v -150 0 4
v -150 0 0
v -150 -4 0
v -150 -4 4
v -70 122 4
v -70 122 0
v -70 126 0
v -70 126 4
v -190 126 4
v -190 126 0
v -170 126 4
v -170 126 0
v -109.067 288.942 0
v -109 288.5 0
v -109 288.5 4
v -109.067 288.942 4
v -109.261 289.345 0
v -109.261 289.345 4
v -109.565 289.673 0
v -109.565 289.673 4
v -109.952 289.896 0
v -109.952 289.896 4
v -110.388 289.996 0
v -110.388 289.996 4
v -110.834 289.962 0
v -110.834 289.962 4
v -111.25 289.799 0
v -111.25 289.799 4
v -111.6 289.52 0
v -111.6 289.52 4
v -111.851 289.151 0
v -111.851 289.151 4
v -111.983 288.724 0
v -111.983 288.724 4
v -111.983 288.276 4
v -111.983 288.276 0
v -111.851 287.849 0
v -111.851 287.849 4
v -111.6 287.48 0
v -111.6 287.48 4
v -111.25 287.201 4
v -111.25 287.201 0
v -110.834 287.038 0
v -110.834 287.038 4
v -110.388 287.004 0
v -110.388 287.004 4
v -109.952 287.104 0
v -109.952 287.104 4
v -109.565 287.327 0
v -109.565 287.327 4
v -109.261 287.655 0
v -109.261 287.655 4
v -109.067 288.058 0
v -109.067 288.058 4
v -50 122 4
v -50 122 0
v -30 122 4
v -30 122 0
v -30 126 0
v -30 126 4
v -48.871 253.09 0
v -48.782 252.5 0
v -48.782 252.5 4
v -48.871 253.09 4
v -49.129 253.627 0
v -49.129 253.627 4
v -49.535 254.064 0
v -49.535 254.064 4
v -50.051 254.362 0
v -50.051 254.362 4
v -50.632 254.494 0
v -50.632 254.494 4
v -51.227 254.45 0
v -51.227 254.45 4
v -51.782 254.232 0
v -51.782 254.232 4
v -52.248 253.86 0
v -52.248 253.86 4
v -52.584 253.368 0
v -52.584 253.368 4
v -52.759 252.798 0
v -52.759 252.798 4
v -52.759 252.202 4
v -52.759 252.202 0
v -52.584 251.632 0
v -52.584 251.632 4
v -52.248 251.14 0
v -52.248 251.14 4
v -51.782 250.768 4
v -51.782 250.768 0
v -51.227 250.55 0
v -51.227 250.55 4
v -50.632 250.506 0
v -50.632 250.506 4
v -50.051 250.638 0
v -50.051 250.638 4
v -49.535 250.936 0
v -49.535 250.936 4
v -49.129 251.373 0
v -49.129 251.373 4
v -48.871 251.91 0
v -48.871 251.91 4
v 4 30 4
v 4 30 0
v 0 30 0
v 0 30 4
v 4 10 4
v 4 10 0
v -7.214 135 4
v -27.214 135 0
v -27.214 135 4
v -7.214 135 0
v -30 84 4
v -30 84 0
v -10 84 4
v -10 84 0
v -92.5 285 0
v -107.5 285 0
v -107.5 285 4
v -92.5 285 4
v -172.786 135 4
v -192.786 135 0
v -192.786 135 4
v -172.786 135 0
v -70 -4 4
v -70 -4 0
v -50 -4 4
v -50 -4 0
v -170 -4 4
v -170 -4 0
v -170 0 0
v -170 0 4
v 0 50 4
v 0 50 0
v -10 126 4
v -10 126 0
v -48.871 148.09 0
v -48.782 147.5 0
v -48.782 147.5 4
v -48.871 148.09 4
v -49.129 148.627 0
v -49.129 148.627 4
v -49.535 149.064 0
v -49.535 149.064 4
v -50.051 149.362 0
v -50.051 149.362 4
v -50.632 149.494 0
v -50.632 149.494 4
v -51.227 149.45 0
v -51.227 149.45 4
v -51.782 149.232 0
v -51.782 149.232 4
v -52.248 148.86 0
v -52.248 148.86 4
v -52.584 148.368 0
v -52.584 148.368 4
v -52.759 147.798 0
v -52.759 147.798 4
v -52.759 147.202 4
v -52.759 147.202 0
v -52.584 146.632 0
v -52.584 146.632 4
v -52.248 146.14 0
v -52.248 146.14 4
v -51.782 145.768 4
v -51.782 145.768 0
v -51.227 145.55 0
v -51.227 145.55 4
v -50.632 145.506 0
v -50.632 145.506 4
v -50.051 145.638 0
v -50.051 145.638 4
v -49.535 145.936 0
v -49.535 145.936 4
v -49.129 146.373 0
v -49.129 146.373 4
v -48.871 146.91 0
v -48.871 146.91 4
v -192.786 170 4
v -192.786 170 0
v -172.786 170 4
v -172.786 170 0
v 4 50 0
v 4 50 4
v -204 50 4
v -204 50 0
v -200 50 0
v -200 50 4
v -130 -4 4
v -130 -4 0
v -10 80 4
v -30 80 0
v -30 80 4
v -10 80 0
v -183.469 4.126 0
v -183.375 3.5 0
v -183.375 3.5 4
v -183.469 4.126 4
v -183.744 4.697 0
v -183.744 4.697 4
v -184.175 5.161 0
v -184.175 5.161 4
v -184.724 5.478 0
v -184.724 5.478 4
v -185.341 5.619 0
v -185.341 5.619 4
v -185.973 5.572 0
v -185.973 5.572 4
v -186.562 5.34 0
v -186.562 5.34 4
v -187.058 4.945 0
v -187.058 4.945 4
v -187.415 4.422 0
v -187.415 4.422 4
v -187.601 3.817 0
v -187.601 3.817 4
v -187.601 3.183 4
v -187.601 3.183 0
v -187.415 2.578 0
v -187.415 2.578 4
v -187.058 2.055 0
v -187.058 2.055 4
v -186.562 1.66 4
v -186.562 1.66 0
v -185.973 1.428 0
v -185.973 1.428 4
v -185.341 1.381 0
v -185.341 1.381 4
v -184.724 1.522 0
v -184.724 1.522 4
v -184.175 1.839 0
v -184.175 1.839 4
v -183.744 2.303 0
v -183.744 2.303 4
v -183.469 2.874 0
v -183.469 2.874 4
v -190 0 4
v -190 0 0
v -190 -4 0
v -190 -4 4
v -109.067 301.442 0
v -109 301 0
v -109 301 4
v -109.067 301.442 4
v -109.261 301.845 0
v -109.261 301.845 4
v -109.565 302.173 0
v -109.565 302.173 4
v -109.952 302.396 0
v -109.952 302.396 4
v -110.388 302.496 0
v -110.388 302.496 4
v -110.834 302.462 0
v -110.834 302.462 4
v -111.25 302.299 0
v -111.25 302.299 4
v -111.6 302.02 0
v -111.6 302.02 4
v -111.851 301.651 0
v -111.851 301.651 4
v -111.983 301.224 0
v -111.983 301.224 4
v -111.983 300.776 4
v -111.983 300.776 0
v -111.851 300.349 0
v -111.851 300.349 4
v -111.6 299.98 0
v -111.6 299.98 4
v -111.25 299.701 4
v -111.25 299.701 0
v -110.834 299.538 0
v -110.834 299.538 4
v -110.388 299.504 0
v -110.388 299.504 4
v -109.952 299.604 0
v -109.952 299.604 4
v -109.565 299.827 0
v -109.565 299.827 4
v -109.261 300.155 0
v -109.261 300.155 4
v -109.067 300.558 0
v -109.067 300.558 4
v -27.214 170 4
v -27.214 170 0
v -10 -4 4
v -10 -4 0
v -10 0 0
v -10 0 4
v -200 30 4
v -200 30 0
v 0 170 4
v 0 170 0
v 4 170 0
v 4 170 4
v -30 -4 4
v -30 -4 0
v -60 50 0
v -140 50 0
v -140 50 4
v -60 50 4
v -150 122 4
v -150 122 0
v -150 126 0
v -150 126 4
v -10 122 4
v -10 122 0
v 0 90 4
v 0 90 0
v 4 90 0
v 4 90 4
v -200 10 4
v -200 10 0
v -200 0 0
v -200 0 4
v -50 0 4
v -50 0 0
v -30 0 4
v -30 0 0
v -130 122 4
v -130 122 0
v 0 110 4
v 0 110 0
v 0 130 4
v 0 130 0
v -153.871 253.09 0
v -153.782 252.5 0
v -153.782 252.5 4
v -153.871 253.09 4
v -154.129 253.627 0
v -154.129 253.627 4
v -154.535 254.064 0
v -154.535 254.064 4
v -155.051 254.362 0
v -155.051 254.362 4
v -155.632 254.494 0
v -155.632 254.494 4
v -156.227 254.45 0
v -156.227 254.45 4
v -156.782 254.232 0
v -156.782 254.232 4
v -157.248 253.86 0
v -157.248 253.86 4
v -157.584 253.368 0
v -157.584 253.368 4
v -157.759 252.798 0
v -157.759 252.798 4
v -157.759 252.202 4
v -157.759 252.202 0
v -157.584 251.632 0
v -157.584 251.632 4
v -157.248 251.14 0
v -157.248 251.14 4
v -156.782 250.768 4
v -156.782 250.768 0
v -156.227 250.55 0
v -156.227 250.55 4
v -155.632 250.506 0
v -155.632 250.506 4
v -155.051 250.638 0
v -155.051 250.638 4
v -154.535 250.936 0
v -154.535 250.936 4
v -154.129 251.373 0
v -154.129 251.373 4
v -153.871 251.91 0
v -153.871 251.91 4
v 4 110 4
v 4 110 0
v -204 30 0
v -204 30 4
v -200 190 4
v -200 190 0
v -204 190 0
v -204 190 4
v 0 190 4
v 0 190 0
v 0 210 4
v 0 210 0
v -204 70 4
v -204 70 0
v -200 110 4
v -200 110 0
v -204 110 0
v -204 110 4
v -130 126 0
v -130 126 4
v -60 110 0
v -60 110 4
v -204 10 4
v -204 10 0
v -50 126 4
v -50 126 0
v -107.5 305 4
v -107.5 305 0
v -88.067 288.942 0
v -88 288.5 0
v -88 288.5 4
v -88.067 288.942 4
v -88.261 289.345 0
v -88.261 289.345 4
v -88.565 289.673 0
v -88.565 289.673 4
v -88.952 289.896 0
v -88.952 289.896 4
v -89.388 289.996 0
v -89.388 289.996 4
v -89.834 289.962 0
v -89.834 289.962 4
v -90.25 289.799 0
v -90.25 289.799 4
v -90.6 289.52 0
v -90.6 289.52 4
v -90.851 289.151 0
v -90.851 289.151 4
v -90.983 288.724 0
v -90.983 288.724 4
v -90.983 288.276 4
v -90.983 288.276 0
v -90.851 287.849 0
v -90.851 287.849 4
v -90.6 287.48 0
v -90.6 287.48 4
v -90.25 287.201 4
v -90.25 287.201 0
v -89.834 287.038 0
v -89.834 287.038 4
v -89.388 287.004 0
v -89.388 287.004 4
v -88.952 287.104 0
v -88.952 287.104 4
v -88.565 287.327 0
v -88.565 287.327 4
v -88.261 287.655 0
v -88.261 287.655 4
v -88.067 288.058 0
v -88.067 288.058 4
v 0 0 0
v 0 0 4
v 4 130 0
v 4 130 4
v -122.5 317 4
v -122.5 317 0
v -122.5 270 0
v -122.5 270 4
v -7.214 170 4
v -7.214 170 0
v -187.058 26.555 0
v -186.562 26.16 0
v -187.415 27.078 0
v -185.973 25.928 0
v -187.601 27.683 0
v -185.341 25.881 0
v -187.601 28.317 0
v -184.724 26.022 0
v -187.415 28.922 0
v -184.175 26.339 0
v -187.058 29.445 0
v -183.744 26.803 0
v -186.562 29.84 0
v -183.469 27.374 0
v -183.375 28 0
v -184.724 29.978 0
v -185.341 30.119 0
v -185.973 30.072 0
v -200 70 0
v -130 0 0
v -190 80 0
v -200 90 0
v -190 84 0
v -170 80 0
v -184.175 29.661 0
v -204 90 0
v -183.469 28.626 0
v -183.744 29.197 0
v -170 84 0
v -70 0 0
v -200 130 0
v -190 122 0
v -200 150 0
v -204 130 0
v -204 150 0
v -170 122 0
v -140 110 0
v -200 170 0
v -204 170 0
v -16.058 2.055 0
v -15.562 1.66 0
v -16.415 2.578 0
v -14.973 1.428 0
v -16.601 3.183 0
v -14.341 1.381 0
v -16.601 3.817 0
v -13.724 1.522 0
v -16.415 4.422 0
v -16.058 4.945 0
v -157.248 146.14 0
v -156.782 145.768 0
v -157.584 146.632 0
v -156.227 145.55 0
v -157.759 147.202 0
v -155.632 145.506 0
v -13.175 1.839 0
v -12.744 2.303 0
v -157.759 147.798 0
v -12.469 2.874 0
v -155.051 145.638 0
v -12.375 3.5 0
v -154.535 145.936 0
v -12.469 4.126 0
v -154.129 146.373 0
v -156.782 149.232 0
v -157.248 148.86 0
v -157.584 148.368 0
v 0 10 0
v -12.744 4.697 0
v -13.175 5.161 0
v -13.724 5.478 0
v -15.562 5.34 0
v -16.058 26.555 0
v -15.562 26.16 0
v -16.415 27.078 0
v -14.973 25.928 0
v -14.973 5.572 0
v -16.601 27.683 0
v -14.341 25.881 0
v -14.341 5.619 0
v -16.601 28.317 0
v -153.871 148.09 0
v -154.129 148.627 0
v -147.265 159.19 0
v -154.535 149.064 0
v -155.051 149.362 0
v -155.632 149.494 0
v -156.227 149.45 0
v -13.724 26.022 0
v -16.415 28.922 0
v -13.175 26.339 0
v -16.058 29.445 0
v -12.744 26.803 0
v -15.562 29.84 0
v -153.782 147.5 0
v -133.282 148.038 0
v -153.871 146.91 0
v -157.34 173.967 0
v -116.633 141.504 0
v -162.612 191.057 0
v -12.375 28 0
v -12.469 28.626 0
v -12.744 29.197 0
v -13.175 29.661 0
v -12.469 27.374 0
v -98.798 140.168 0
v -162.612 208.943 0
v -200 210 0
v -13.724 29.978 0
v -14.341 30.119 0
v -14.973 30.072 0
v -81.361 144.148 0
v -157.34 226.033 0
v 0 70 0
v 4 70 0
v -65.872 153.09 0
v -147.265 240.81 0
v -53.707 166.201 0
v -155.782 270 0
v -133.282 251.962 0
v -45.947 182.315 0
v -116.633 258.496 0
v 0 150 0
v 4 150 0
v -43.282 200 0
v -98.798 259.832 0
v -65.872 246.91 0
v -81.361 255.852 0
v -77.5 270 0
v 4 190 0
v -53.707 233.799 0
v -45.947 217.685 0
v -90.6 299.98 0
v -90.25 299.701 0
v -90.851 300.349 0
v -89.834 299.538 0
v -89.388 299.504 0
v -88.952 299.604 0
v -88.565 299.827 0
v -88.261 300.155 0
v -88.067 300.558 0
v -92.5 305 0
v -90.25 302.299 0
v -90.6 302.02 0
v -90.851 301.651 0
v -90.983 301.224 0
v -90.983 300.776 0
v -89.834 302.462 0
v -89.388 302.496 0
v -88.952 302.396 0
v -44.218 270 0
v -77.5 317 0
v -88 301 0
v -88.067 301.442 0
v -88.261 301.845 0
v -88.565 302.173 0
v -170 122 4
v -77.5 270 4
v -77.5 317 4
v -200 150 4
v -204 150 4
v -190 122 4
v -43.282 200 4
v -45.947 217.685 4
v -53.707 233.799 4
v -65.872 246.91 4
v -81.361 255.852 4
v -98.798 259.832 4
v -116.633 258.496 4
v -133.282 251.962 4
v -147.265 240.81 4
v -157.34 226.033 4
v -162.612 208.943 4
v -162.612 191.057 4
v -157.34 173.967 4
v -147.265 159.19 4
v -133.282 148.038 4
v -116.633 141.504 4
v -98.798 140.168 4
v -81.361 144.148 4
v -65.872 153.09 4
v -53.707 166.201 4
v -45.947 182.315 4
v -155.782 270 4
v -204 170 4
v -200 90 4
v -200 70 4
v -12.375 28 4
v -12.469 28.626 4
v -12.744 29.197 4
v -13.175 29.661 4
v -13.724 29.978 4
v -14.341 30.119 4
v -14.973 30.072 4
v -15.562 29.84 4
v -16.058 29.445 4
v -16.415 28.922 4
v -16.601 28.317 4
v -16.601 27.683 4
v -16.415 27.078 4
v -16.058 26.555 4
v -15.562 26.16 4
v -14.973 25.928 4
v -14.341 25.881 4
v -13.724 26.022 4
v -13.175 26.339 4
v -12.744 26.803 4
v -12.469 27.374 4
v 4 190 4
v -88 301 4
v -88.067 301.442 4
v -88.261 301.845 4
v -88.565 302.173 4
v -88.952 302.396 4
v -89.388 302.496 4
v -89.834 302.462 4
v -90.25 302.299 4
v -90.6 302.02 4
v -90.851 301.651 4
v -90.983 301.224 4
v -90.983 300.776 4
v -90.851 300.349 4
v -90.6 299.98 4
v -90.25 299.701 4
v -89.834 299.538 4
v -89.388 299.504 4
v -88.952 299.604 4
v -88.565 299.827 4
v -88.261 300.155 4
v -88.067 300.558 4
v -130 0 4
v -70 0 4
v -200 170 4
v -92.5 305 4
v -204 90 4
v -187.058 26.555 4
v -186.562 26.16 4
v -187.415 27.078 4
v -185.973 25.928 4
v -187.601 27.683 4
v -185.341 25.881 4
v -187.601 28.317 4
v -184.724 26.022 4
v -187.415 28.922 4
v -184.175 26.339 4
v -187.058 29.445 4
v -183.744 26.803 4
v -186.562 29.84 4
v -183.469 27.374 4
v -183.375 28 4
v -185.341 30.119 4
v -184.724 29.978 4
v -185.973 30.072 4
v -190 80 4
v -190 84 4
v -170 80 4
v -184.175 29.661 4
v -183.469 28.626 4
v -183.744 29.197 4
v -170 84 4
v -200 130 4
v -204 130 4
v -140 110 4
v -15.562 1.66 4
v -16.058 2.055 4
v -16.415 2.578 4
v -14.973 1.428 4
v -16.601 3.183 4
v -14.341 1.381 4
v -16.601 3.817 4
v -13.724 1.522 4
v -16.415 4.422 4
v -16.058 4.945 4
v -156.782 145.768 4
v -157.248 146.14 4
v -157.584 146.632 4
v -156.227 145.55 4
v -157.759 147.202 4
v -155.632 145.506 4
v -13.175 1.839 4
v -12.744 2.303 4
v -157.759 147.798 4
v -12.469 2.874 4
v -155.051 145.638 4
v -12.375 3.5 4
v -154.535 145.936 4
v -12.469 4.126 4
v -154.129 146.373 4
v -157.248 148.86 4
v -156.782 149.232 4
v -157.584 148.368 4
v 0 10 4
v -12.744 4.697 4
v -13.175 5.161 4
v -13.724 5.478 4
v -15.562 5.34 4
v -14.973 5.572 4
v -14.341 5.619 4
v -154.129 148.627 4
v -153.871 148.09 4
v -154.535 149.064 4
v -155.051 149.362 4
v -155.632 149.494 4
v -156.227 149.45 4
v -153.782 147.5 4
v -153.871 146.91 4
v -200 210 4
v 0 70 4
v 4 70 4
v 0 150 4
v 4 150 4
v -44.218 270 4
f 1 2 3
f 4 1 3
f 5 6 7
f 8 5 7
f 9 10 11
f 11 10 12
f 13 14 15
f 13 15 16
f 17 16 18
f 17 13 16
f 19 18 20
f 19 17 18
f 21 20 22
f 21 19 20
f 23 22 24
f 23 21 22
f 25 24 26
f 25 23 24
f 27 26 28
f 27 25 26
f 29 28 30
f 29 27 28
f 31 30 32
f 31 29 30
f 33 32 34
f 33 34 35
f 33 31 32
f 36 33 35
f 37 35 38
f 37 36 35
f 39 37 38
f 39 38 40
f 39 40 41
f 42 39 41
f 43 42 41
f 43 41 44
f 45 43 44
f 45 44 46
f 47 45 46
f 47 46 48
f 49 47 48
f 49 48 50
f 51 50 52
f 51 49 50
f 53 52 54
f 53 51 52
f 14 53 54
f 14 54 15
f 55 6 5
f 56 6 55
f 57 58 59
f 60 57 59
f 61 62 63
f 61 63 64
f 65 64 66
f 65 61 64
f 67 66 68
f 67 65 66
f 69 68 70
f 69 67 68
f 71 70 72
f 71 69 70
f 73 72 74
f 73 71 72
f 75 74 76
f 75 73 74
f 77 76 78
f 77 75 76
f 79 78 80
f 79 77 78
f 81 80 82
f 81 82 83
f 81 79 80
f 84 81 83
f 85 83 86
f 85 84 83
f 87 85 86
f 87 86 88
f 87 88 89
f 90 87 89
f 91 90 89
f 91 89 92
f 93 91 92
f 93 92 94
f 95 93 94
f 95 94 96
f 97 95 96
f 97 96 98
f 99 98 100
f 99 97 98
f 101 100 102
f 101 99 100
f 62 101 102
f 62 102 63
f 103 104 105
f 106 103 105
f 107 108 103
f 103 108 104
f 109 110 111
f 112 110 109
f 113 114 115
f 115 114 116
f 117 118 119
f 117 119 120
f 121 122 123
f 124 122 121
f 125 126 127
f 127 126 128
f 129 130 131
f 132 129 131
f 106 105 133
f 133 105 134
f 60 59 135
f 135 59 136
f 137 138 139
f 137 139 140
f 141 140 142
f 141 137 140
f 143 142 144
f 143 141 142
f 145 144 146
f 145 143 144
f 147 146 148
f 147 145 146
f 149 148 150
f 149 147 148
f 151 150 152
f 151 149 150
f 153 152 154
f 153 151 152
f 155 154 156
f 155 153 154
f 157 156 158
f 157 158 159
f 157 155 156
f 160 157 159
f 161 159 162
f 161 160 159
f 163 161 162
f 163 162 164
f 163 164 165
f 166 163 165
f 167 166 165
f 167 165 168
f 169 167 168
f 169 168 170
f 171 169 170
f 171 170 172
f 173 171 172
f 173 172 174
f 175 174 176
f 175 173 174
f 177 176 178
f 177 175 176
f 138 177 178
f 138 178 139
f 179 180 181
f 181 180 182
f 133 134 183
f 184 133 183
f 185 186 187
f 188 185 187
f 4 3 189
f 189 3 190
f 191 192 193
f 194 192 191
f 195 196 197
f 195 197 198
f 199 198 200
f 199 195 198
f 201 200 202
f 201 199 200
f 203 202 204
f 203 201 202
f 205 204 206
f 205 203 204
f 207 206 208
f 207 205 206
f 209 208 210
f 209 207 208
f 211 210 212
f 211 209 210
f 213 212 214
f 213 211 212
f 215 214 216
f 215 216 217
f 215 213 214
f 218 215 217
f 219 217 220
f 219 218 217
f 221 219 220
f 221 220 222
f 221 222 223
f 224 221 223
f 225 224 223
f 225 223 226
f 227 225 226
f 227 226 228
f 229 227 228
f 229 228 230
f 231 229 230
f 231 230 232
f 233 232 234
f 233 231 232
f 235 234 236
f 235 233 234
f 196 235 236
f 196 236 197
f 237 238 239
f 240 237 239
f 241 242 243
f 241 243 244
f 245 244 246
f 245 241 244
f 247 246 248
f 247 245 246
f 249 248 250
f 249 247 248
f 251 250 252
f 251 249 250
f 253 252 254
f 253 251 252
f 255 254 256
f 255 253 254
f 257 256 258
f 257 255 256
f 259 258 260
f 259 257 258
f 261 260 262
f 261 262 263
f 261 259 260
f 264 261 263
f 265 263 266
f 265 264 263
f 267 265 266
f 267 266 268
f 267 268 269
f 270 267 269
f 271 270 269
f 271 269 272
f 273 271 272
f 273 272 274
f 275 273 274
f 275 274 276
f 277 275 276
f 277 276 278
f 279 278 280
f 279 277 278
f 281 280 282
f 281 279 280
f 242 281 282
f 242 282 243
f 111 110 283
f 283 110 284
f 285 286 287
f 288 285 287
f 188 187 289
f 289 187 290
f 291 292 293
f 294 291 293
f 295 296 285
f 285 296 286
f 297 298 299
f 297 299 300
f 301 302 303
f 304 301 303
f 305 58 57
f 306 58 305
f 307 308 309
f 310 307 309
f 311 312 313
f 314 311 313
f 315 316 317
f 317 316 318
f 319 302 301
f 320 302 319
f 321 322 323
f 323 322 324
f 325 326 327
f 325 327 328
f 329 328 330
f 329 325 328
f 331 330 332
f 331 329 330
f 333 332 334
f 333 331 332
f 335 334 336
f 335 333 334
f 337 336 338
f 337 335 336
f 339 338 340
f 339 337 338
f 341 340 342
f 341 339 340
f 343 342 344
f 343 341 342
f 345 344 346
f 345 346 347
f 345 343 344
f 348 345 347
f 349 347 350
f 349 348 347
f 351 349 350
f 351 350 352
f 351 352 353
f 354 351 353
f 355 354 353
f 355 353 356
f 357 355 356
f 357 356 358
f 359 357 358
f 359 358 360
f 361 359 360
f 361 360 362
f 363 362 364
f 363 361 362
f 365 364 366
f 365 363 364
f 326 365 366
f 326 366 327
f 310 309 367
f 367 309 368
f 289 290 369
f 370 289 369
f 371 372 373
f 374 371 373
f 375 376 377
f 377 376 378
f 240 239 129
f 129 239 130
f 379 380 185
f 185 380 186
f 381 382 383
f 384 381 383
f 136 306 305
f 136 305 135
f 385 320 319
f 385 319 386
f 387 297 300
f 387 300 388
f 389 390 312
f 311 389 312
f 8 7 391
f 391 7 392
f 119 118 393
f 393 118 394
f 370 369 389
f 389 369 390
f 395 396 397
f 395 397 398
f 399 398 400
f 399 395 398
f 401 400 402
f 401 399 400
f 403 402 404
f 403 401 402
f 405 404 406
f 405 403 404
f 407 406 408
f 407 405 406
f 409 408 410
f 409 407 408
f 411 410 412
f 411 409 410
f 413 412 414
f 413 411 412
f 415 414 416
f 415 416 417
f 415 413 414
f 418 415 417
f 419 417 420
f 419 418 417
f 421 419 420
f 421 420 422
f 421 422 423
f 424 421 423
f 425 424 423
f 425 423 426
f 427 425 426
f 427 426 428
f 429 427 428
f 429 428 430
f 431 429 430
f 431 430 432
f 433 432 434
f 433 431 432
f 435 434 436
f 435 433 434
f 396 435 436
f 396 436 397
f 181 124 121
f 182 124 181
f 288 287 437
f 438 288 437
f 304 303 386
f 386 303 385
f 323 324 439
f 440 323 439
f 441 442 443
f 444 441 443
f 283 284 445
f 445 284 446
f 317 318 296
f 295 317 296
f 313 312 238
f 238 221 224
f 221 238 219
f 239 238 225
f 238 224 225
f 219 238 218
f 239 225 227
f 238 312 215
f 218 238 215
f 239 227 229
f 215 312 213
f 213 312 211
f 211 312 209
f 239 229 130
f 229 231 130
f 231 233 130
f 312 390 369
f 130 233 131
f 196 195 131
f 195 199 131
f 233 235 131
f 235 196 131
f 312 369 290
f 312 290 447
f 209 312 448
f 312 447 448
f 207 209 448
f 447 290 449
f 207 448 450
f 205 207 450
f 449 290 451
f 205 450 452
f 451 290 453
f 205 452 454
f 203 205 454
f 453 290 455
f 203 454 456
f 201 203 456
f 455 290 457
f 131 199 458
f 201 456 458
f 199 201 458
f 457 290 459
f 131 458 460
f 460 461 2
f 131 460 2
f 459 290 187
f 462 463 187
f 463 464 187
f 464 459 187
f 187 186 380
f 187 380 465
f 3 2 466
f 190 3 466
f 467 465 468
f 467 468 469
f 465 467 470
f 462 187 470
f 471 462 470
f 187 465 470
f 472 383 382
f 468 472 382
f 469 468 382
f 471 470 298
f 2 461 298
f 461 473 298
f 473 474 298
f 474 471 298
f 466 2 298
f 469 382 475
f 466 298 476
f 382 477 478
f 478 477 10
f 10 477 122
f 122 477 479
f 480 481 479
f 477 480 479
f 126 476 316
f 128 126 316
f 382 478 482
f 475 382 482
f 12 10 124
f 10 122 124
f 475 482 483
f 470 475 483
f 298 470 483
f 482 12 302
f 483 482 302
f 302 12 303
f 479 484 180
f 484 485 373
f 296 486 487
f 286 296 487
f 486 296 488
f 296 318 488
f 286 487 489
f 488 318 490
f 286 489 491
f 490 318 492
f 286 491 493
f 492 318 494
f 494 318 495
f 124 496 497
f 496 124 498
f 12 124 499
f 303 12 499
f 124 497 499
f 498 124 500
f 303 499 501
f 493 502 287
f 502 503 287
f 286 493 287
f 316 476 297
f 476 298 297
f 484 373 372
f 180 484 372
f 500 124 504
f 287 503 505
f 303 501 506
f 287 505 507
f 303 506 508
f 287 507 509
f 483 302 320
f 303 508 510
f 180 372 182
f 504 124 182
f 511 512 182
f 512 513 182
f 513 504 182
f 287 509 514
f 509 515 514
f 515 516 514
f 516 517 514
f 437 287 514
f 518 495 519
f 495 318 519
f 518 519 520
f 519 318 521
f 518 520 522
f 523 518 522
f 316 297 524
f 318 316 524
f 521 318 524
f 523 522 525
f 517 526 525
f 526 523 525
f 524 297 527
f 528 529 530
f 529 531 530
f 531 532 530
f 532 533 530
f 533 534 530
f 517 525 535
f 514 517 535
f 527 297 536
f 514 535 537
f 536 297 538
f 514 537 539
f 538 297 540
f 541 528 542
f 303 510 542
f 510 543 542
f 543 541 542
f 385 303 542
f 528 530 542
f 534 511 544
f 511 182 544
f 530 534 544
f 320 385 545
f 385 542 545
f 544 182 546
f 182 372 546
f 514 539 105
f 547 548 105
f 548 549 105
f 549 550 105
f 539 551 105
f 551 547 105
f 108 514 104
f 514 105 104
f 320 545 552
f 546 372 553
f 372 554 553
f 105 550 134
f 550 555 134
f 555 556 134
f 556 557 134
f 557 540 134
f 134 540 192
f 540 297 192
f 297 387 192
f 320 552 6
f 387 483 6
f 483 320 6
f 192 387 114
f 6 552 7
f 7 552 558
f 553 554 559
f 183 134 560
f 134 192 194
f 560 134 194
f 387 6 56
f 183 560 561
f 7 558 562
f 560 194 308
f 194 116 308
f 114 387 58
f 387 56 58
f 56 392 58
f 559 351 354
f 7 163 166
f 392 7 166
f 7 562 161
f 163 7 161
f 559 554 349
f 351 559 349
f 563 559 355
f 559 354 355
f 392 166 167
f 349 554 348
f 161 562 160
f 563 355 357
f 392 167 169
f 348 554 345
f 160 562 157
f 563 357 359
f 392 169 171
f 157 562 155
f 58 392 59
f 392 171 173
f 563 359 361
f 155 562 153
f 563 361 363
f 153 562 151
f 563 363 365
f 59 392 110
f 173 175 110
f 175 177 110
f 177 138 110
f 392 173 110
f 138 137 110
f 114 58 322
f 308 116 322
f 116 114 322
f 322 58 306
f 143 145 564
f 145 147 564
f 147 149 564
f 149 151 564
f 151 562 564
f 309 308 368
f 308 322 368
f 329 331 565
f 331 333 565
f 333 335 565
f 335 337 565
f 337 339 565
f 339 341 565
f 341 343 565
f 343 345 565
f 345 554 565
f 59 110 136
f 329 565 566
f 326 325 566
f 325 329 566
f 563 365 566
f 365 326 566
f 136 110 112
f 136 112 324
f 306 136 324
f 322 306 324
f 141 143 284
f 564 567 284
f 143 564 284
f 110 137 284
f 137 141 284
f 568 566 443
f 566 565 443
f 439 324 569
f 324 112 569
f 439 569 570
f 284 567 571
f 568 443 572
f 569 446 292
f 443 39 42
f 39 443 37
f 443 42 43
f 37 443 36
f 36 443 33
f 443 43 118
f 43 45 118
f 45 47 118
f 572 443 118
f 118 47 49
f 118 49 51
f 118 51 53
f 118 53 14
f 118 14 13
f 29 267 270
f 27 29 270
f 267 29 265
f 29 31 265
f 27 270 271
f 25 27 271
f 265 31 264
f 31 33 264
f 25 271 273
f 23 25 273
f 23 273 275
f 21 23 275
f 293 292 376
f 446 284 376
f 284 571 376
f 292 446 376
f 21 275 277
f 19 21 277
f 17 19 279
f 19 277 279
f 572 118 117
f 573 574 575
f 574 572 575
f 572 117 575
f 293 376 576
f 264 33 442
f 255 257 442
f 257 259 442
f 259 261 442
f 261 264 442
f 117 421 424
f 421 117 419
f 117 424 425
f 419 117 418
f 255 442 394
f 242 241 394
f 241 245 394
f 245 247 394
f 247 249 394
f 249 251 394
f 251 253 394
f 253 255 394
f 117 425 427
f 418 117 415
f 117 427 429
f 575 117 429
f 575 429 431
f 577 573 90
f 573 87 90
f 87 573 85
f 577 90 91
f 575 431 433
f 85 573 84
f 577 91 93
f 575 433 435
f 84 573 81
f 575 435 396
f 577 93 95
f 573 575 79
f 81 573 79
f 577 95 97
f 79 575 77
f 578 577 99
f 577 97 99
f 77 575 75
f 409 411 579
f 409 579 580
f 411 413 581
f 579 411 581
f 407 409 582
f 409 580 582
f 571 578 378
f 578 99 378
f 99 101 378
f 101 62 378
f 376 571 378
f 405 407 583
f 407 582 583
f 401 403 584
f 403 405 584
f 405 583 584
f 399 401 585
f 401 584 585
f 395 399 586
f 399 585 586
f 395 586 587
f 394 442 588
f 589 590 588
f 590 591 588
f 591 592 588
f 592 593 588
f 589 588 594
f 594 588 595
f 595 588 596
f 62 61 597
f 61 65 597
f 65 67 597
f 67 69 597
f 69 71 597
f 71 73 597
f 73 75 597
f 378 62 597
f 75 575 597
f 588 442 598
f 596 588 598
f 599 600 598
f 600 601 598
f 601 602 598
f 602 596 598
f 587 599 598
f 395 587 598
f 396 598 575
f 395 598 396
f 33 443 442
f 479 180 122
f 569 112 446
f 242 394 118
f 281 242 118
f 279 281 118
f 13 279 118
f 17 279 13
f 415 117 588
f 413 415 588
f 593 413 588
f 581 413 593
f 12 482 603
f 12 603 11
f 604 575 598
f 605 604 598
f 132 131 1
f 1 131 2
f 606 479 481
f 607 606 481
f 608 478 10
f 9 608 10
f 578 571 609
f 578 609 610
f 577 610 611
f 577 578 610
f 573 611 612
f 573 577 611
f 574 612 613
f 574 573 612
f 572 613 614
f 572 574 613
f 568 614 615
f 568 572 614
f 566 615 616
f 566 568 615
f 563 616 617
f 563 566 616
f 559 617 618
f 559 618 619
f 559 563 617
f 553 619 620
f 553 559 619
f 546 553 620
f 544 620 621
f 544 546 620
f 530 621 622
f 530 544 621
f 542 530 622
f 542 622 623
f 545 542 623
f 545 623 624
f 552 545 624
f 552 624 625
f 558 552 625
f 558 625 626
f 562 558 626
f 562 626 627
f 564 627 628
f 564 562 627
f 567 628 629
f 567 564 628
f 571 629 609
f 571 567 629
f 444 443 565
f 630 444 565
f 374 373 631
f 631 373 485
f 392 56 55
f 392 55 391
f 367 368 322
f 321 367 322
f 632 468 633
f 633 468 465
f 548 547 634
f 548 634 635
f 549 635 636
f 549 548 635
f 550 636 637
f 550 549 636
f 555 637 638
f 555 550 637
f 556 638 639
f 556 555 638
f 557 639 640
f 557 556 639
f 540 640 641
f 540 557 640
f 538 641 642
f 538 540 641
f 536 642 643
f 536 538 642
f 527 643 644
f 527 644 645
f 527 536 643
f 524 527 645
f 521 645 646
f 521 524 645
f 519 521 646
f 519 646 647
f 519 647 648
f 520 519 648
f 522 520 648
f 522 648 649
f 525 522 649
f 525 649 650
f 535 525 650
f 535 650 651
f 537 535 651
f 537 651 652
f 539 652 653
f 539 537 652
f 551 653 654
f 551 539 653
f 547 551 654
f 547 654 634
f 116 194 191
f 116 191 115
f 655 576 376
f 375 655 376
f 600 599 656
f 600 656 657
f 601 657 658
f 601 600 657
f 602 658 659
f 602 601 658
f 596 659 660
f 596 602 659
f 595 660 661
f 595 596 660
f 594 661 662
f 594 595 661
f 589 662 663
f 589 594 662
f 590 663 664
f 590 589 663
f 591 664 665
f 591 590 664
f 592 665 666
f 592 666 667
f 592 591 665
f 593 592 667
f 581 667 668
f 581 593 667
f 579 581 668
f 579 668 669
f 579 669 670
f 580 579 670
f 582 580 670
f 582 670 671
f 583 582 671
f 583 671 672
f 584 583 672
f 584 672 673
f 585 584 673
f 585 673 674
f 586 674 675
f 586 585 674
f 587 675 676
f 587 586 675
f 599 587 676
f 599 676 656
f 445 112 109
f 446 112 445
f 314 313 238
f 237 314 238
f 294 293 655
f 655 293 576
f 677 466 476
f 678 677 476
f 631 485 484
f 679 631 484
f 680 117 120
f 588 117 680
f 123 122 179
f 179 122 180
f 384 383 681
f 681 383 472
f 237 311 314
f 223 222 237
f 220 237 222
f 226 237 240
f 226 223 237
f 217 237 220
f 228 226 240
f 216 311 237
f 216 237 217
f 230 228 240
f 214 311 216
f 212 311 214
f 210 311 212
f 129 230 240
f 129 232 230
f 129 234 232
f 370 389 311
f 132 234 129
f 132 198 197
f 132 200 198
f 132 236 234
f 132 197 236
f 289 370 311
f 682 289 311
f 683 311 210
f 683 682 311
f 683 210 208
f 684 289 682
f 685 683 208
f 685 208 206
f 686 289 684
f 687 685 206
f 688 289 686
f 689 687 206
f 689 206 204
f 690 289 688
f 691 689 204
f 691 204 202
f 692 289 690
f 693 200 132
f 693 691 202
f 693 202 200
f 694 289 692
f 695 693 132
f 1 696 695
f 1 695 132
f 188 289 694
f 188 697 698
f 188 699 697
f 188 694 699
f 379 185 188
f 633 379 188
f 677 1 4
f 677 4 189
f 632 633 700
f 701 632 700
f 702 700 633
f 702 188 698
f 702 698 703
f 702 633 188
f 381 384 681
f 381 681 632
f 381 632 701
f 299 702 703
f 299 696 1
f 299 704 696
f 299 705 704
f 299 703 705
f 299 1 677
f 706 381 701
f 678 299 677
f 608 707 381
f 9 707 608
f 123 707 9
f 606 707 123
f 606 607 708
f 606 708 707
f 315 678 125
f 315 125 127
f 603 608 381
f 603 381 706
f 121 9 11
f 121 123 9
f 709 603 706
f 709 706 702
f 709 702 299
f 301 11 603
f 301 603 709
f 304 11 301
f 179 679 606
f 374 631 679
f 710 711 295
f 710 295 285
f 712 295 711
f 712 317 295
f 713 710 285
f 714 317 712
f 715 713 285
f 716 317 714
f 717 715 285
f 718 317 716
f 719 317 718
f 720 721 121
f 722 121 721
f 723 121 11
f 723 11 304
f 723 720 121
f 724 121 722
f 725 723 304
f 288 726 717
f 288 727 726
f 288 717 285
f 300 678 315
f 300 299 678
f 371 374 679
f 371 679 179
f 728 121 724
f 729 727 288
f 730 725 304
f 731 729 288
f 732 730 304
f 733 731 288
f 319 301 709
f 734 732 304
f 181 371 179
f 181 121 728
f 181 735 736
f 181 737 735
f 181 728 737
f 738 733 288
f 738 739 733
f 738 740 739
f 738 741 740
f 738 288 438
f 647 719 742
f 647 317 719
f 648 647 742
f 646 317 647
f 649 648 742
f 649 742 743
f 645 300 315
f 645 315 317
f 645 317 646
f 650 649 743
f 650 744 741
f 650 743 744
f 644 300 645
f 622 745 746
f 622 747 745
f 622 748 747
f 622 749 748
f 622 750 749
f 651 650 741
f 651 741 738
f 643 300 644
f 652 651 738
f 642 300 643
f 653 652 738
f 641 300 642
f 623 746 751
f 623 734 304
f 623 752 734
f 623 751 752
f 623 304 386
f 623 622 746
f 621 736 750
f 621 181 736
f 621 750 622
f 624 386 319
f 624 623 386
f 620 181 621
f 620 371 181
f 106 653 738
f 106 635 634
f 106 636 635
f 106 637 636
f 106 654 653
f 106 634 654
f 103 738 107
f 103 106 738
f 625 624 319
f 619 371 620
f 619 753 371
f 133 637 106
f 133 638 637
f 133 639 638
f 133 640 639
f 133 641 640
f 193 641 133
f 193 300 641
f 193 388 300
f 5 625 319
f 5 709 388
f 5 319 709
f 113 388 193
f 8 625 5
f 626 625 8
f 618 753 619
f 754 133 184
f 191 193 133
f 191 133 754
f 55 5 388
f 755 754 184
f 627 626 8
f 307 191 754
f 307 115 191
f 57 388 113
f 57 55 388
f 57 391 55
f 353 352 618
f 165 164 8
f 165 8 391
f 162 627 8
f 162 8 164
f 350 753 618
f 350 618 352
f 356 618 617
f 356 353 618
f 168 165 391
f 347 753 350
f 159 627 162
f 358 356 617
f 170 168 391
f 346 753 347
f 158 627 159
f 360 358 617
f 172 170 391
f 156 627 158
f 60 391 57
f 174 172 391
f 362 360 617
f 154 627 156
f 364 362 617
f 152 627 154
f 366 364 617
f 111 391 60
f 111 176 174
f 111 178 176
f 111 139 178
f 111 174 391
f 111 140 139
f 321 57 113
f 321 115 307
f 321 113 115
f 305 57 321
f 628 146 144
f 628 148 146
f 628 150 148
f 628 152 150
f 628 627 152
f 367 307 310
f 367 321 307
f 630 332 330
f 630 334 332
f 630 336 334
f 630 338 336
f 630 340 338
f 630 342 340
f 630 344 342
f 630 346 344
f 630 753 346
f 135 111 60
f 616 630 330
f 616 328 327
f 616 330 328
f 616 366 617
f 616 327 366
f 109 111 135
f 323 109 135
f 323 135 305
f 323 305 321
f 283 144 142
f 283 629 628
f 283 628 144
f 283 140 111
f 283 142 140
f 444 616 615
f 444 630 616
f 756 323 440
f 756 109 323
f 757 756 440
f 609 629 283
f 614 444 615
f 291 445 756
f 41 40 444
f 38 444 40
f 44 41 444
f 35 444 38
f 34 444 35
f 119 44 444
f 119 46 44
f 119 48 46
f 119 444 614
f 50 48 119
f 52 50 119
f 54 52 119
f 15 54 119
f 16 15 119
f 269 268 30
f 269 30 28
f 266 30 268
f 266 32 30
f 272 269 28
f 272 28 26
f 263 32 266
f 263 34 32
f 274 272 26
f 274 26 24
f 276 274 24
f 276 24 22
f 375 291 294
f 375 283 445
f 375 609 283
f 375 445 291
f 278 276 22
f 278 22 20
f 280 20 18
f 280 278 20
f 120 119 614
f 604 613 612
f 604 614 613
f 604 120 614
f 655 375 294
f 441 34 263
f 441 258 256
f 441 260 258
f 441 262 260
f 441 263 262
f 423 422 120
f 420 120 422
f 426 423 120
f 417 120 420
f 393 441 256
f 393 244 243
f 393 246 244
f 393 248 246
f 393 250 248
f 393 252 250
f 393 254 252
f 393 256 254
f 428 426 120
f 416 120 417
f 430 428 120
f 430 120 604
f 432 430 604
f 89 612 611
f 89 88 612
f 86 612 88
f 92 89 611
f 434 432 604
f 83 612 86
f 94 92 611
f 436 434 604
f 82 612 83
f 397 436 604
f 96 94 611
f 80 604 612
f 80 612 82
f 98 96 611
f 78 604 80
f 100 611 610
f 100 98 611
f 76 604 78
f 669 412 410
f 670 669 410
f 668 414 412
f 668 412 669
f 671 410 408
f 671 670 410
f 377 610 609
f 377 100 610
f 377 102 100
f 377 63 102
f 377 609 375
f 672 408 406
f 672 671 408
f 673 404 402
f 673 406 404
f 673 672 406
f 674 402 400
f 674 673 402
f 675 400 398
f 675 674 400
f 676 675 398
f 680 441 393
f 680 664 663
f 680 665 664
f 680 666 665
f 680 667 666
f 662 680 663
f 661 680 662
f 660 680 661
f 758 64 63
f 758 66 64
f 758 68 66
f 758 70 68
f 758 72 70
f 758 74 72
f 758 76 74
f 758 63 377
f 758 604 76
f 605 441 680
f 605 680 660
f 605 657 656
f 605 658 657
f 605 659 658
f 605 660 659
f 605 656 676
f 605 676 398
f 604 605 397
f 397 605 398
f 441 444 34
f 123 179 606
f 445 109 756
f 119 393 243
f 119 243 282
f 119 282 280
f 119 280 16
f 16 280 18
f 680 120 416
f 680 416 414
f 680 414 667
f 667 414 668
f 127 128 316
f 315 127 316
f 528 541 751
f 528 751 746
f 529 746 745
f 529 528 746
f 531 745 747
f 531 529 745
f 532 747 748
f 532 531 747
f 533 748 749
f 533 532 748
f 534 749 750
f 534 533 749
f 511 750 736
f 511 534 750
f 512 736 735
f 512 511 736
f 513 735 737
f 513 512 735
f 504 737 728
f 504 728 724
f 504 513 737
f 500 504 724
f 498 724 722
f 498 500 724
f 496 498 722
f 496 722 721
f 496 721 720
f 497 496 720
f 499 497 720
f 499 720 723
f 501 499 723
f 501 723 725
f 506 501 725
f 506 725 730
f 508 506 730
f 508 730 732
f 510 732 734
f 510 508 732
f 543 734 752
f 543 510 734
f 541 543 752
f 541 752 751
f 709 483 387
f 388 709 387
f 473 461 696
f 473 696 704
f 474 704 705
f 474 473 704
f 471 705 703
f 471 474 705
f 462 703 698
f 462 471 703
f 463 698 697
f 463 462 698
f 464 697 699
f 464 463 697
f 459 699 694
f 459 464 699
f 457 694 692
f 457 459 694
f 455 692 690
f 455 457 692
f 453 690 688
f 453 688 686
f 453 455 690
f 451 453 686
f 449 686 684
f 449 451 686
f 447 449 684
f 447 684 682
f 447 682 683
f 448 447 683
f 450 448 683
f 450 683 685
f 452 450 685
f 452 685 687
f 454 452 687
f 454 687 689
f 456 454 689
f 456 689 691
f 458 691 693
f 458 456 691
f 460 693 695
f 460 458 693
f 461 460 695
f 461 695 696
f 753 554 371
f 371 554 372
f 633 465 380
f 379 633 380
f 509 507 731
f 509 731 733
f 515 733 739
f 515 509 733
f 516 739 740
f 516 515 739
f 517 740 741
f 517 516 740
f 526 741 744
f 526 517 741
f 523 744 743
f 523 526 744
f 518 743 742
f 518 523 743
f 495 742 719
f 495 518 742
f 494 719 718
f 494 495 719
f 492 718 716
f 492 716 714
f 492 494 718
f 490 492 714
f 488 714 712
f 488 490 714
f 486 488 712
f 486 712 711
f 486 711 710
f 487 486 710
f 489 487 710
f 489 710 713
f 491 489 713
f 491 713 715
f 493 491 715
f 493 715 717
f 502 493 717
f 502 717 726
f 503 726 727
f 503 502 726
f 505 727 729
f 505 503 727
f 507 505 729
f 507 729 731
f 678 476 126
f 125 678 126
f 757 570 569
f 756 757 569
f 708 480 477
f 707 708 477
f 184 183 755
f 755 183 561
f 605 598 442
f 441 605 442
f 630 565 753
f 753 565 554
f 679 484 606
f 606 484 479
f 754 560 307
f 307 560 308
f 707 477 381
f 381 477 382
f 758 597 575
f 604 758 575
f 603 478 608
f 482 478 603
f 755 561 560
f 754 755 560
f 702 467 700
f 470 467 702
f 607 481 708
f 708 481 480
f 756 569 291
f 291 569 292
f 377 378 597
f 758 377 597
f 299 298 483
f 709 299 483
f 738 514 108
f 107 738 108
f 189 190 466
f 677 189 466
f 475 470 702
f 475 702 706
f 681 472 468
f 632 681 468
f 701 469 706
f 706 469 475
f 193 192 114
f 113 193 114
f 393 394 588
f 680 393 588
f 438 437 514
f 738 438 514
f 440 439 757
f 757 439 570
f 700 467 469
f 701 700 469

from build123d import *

# Parameters (mm, degrees)
SKICA1_R                = 2.125
SKICA1_W                = 20
SKICA1_H                = 4
SKICA1_H_2              = 35
SKICA1_R_2              = 2
SKICA1_W_2              = 80
SKICA1_H_3              = 60
SKICA1_R_3              = 60
SKICA1_R_4              = 1.5
SKICA1_W_3              = 15
SKICA1_H_4              = 20
P_IDAT_VYSUNUT_M1_DEPTH = 4


with BuildPart() as part:
    # Skica1 → Přidat vysunutím1 (new body)
    with BuildSketch(Plane.XY):
        Polygon((0, 0), (0, 10), (4, 10), (4, 30), (0, 30), (0, 50), (4, 50), (4, 70), (0, 70), (0, 90), (4, 90), (4, 110), (0, 110), (0, 130), (4, 130), (4, 150), (0, 150), (0, 170), (4, 170), (4, 190), (0, 190), (0, 210), (-44.218272824, 270), (-77.5, 270), (-77.5, 317), (-122.5, 317), (-122.5, 270), (-155.781727176, 270), (-200, 210), (-200, 190), (-204, 190), (-204, 170), (-200, 170), (-200, 150), (-204, 150), (-204, 130), (-200, 130), (-200, 110), (-204, 110), (-204, 90), (-200, 90), (-200, 70), (-204, 70), (-204, 50), (-200, 50), (-200, 30), (-204, 30), (-204, 10), (-200, 10), (-200, 0), (-190, 0), (-190, -4), (-170, -4), (-170, 0), (-150, 0), (-150, -4), (-130, -4), (-130, 0), (-70, 0), (-70, -4), (-50, -4), (-50, 0), (-30, 0), (-30, -4), (-10, -4), (-10, 0), align=None)
        with Locations((-185.5, 3.5)):
            Circle(SKICA1_R, mode=Mode.SUBTRACT)
        with Locations((-185.5, 28)):
            Circle(SKICA1_R, mode=Mode.SUBTRACT)
        with Locations((-180, 82)):
            Rectangle(SKICA1_W, SKICA1_H, mode=Mode.SUBTRACT)
        with Locations((-180, 124)):
            Rectangle(SKICA1_W, SKICA1_H, mode=Mode.SUBTRACT)
        with Locations((-182.785843761, 152.5)):
            Rectangle(SKICA1_W, SKICA1_H_2, mode=Mode.SUBTRACT)
        with Locations((-155.781727176, 147.5)):
            Circle(SKICA1_R_2, mode=Mode.SUBTRACT)
        with Locations((-140, 124)):
            Rectangle(SKICA1_W, SKICA1_H, mode=Mode.SUBTRACT)
        with Locations((-14.5, 3.5)):
            Circle(SKICA1_R, mode=Mode.SUBTRACT)
        with Locations((-14.5, 28)):
            Circle(SKICA1_R, mode=Mode.SUBTRACT)
        with Locations((-100, 80)):
            Rectangle(SKICA1_W_2, SKICA1_H_3, mode=Mode.SUBTRACT)
        with Locations((-60, 124)):
            Rectangle(SKICA1_W, SKICA1_H, mode=Mode.SUBTRACT)
        with Locations((-50.781727176, 147.5)):
            Circle(SKICA1_R_2, mode=Mode.SUBTRACT)
        with Locations((-20, 82)):
            Rectangle(SKICA1_W, SKICA1_H, mode=Mode.SUBTRACT)
        with Locations((-20, 124)):
            Rectangle(SKICA1_W, SKICA1_H, mode=Mode.SUBTRACT)
        with Locations((-17.214156239, 152.5)):
            Rectangle(SKICA1_W, SKICA1_H_2, mode=Mode.SUBTRACT)
        with Locations((-103.281727176, 200)):
            Circle(SKICA1_R_3, mode=Mode.SUBTRACT)
        with Locations((-155.781727176, 252.5)):
            Circle(SKICA1_R_2, mode=Mode.SUBTRACT)
        with Locations((-50.781727176, 252.5)):
            Circle(SKICA1_R_2, mode=Mode.SUBTRACT)
        with Locations((-89.5, 301)):
            Circle(SKICA1_R_4, mode=Mode.SUBTRACT)
        with Locations((-110.5, 288.5)):
            Circle(SKICA1_R_4, mode=Mode.SUBTRACT)
        with Locations((-100, 295)):
            Rectangle(SKICA1_W_3, SKICA1_H_4, mode=Mode.SUBTRACT)
        with Locations((-110.5, 301)):
            Circle(SKICA1_R_4, mode=Mode.SUBTRACT)
        with Locations((-89.5, 288.5)):
            Circle(SKICA1_R_4, mode=Mode.SUBTRACT)
    extrude(amount=P_IDAT_VYSUNUT_M1_DEPTH)


solid = part.part
